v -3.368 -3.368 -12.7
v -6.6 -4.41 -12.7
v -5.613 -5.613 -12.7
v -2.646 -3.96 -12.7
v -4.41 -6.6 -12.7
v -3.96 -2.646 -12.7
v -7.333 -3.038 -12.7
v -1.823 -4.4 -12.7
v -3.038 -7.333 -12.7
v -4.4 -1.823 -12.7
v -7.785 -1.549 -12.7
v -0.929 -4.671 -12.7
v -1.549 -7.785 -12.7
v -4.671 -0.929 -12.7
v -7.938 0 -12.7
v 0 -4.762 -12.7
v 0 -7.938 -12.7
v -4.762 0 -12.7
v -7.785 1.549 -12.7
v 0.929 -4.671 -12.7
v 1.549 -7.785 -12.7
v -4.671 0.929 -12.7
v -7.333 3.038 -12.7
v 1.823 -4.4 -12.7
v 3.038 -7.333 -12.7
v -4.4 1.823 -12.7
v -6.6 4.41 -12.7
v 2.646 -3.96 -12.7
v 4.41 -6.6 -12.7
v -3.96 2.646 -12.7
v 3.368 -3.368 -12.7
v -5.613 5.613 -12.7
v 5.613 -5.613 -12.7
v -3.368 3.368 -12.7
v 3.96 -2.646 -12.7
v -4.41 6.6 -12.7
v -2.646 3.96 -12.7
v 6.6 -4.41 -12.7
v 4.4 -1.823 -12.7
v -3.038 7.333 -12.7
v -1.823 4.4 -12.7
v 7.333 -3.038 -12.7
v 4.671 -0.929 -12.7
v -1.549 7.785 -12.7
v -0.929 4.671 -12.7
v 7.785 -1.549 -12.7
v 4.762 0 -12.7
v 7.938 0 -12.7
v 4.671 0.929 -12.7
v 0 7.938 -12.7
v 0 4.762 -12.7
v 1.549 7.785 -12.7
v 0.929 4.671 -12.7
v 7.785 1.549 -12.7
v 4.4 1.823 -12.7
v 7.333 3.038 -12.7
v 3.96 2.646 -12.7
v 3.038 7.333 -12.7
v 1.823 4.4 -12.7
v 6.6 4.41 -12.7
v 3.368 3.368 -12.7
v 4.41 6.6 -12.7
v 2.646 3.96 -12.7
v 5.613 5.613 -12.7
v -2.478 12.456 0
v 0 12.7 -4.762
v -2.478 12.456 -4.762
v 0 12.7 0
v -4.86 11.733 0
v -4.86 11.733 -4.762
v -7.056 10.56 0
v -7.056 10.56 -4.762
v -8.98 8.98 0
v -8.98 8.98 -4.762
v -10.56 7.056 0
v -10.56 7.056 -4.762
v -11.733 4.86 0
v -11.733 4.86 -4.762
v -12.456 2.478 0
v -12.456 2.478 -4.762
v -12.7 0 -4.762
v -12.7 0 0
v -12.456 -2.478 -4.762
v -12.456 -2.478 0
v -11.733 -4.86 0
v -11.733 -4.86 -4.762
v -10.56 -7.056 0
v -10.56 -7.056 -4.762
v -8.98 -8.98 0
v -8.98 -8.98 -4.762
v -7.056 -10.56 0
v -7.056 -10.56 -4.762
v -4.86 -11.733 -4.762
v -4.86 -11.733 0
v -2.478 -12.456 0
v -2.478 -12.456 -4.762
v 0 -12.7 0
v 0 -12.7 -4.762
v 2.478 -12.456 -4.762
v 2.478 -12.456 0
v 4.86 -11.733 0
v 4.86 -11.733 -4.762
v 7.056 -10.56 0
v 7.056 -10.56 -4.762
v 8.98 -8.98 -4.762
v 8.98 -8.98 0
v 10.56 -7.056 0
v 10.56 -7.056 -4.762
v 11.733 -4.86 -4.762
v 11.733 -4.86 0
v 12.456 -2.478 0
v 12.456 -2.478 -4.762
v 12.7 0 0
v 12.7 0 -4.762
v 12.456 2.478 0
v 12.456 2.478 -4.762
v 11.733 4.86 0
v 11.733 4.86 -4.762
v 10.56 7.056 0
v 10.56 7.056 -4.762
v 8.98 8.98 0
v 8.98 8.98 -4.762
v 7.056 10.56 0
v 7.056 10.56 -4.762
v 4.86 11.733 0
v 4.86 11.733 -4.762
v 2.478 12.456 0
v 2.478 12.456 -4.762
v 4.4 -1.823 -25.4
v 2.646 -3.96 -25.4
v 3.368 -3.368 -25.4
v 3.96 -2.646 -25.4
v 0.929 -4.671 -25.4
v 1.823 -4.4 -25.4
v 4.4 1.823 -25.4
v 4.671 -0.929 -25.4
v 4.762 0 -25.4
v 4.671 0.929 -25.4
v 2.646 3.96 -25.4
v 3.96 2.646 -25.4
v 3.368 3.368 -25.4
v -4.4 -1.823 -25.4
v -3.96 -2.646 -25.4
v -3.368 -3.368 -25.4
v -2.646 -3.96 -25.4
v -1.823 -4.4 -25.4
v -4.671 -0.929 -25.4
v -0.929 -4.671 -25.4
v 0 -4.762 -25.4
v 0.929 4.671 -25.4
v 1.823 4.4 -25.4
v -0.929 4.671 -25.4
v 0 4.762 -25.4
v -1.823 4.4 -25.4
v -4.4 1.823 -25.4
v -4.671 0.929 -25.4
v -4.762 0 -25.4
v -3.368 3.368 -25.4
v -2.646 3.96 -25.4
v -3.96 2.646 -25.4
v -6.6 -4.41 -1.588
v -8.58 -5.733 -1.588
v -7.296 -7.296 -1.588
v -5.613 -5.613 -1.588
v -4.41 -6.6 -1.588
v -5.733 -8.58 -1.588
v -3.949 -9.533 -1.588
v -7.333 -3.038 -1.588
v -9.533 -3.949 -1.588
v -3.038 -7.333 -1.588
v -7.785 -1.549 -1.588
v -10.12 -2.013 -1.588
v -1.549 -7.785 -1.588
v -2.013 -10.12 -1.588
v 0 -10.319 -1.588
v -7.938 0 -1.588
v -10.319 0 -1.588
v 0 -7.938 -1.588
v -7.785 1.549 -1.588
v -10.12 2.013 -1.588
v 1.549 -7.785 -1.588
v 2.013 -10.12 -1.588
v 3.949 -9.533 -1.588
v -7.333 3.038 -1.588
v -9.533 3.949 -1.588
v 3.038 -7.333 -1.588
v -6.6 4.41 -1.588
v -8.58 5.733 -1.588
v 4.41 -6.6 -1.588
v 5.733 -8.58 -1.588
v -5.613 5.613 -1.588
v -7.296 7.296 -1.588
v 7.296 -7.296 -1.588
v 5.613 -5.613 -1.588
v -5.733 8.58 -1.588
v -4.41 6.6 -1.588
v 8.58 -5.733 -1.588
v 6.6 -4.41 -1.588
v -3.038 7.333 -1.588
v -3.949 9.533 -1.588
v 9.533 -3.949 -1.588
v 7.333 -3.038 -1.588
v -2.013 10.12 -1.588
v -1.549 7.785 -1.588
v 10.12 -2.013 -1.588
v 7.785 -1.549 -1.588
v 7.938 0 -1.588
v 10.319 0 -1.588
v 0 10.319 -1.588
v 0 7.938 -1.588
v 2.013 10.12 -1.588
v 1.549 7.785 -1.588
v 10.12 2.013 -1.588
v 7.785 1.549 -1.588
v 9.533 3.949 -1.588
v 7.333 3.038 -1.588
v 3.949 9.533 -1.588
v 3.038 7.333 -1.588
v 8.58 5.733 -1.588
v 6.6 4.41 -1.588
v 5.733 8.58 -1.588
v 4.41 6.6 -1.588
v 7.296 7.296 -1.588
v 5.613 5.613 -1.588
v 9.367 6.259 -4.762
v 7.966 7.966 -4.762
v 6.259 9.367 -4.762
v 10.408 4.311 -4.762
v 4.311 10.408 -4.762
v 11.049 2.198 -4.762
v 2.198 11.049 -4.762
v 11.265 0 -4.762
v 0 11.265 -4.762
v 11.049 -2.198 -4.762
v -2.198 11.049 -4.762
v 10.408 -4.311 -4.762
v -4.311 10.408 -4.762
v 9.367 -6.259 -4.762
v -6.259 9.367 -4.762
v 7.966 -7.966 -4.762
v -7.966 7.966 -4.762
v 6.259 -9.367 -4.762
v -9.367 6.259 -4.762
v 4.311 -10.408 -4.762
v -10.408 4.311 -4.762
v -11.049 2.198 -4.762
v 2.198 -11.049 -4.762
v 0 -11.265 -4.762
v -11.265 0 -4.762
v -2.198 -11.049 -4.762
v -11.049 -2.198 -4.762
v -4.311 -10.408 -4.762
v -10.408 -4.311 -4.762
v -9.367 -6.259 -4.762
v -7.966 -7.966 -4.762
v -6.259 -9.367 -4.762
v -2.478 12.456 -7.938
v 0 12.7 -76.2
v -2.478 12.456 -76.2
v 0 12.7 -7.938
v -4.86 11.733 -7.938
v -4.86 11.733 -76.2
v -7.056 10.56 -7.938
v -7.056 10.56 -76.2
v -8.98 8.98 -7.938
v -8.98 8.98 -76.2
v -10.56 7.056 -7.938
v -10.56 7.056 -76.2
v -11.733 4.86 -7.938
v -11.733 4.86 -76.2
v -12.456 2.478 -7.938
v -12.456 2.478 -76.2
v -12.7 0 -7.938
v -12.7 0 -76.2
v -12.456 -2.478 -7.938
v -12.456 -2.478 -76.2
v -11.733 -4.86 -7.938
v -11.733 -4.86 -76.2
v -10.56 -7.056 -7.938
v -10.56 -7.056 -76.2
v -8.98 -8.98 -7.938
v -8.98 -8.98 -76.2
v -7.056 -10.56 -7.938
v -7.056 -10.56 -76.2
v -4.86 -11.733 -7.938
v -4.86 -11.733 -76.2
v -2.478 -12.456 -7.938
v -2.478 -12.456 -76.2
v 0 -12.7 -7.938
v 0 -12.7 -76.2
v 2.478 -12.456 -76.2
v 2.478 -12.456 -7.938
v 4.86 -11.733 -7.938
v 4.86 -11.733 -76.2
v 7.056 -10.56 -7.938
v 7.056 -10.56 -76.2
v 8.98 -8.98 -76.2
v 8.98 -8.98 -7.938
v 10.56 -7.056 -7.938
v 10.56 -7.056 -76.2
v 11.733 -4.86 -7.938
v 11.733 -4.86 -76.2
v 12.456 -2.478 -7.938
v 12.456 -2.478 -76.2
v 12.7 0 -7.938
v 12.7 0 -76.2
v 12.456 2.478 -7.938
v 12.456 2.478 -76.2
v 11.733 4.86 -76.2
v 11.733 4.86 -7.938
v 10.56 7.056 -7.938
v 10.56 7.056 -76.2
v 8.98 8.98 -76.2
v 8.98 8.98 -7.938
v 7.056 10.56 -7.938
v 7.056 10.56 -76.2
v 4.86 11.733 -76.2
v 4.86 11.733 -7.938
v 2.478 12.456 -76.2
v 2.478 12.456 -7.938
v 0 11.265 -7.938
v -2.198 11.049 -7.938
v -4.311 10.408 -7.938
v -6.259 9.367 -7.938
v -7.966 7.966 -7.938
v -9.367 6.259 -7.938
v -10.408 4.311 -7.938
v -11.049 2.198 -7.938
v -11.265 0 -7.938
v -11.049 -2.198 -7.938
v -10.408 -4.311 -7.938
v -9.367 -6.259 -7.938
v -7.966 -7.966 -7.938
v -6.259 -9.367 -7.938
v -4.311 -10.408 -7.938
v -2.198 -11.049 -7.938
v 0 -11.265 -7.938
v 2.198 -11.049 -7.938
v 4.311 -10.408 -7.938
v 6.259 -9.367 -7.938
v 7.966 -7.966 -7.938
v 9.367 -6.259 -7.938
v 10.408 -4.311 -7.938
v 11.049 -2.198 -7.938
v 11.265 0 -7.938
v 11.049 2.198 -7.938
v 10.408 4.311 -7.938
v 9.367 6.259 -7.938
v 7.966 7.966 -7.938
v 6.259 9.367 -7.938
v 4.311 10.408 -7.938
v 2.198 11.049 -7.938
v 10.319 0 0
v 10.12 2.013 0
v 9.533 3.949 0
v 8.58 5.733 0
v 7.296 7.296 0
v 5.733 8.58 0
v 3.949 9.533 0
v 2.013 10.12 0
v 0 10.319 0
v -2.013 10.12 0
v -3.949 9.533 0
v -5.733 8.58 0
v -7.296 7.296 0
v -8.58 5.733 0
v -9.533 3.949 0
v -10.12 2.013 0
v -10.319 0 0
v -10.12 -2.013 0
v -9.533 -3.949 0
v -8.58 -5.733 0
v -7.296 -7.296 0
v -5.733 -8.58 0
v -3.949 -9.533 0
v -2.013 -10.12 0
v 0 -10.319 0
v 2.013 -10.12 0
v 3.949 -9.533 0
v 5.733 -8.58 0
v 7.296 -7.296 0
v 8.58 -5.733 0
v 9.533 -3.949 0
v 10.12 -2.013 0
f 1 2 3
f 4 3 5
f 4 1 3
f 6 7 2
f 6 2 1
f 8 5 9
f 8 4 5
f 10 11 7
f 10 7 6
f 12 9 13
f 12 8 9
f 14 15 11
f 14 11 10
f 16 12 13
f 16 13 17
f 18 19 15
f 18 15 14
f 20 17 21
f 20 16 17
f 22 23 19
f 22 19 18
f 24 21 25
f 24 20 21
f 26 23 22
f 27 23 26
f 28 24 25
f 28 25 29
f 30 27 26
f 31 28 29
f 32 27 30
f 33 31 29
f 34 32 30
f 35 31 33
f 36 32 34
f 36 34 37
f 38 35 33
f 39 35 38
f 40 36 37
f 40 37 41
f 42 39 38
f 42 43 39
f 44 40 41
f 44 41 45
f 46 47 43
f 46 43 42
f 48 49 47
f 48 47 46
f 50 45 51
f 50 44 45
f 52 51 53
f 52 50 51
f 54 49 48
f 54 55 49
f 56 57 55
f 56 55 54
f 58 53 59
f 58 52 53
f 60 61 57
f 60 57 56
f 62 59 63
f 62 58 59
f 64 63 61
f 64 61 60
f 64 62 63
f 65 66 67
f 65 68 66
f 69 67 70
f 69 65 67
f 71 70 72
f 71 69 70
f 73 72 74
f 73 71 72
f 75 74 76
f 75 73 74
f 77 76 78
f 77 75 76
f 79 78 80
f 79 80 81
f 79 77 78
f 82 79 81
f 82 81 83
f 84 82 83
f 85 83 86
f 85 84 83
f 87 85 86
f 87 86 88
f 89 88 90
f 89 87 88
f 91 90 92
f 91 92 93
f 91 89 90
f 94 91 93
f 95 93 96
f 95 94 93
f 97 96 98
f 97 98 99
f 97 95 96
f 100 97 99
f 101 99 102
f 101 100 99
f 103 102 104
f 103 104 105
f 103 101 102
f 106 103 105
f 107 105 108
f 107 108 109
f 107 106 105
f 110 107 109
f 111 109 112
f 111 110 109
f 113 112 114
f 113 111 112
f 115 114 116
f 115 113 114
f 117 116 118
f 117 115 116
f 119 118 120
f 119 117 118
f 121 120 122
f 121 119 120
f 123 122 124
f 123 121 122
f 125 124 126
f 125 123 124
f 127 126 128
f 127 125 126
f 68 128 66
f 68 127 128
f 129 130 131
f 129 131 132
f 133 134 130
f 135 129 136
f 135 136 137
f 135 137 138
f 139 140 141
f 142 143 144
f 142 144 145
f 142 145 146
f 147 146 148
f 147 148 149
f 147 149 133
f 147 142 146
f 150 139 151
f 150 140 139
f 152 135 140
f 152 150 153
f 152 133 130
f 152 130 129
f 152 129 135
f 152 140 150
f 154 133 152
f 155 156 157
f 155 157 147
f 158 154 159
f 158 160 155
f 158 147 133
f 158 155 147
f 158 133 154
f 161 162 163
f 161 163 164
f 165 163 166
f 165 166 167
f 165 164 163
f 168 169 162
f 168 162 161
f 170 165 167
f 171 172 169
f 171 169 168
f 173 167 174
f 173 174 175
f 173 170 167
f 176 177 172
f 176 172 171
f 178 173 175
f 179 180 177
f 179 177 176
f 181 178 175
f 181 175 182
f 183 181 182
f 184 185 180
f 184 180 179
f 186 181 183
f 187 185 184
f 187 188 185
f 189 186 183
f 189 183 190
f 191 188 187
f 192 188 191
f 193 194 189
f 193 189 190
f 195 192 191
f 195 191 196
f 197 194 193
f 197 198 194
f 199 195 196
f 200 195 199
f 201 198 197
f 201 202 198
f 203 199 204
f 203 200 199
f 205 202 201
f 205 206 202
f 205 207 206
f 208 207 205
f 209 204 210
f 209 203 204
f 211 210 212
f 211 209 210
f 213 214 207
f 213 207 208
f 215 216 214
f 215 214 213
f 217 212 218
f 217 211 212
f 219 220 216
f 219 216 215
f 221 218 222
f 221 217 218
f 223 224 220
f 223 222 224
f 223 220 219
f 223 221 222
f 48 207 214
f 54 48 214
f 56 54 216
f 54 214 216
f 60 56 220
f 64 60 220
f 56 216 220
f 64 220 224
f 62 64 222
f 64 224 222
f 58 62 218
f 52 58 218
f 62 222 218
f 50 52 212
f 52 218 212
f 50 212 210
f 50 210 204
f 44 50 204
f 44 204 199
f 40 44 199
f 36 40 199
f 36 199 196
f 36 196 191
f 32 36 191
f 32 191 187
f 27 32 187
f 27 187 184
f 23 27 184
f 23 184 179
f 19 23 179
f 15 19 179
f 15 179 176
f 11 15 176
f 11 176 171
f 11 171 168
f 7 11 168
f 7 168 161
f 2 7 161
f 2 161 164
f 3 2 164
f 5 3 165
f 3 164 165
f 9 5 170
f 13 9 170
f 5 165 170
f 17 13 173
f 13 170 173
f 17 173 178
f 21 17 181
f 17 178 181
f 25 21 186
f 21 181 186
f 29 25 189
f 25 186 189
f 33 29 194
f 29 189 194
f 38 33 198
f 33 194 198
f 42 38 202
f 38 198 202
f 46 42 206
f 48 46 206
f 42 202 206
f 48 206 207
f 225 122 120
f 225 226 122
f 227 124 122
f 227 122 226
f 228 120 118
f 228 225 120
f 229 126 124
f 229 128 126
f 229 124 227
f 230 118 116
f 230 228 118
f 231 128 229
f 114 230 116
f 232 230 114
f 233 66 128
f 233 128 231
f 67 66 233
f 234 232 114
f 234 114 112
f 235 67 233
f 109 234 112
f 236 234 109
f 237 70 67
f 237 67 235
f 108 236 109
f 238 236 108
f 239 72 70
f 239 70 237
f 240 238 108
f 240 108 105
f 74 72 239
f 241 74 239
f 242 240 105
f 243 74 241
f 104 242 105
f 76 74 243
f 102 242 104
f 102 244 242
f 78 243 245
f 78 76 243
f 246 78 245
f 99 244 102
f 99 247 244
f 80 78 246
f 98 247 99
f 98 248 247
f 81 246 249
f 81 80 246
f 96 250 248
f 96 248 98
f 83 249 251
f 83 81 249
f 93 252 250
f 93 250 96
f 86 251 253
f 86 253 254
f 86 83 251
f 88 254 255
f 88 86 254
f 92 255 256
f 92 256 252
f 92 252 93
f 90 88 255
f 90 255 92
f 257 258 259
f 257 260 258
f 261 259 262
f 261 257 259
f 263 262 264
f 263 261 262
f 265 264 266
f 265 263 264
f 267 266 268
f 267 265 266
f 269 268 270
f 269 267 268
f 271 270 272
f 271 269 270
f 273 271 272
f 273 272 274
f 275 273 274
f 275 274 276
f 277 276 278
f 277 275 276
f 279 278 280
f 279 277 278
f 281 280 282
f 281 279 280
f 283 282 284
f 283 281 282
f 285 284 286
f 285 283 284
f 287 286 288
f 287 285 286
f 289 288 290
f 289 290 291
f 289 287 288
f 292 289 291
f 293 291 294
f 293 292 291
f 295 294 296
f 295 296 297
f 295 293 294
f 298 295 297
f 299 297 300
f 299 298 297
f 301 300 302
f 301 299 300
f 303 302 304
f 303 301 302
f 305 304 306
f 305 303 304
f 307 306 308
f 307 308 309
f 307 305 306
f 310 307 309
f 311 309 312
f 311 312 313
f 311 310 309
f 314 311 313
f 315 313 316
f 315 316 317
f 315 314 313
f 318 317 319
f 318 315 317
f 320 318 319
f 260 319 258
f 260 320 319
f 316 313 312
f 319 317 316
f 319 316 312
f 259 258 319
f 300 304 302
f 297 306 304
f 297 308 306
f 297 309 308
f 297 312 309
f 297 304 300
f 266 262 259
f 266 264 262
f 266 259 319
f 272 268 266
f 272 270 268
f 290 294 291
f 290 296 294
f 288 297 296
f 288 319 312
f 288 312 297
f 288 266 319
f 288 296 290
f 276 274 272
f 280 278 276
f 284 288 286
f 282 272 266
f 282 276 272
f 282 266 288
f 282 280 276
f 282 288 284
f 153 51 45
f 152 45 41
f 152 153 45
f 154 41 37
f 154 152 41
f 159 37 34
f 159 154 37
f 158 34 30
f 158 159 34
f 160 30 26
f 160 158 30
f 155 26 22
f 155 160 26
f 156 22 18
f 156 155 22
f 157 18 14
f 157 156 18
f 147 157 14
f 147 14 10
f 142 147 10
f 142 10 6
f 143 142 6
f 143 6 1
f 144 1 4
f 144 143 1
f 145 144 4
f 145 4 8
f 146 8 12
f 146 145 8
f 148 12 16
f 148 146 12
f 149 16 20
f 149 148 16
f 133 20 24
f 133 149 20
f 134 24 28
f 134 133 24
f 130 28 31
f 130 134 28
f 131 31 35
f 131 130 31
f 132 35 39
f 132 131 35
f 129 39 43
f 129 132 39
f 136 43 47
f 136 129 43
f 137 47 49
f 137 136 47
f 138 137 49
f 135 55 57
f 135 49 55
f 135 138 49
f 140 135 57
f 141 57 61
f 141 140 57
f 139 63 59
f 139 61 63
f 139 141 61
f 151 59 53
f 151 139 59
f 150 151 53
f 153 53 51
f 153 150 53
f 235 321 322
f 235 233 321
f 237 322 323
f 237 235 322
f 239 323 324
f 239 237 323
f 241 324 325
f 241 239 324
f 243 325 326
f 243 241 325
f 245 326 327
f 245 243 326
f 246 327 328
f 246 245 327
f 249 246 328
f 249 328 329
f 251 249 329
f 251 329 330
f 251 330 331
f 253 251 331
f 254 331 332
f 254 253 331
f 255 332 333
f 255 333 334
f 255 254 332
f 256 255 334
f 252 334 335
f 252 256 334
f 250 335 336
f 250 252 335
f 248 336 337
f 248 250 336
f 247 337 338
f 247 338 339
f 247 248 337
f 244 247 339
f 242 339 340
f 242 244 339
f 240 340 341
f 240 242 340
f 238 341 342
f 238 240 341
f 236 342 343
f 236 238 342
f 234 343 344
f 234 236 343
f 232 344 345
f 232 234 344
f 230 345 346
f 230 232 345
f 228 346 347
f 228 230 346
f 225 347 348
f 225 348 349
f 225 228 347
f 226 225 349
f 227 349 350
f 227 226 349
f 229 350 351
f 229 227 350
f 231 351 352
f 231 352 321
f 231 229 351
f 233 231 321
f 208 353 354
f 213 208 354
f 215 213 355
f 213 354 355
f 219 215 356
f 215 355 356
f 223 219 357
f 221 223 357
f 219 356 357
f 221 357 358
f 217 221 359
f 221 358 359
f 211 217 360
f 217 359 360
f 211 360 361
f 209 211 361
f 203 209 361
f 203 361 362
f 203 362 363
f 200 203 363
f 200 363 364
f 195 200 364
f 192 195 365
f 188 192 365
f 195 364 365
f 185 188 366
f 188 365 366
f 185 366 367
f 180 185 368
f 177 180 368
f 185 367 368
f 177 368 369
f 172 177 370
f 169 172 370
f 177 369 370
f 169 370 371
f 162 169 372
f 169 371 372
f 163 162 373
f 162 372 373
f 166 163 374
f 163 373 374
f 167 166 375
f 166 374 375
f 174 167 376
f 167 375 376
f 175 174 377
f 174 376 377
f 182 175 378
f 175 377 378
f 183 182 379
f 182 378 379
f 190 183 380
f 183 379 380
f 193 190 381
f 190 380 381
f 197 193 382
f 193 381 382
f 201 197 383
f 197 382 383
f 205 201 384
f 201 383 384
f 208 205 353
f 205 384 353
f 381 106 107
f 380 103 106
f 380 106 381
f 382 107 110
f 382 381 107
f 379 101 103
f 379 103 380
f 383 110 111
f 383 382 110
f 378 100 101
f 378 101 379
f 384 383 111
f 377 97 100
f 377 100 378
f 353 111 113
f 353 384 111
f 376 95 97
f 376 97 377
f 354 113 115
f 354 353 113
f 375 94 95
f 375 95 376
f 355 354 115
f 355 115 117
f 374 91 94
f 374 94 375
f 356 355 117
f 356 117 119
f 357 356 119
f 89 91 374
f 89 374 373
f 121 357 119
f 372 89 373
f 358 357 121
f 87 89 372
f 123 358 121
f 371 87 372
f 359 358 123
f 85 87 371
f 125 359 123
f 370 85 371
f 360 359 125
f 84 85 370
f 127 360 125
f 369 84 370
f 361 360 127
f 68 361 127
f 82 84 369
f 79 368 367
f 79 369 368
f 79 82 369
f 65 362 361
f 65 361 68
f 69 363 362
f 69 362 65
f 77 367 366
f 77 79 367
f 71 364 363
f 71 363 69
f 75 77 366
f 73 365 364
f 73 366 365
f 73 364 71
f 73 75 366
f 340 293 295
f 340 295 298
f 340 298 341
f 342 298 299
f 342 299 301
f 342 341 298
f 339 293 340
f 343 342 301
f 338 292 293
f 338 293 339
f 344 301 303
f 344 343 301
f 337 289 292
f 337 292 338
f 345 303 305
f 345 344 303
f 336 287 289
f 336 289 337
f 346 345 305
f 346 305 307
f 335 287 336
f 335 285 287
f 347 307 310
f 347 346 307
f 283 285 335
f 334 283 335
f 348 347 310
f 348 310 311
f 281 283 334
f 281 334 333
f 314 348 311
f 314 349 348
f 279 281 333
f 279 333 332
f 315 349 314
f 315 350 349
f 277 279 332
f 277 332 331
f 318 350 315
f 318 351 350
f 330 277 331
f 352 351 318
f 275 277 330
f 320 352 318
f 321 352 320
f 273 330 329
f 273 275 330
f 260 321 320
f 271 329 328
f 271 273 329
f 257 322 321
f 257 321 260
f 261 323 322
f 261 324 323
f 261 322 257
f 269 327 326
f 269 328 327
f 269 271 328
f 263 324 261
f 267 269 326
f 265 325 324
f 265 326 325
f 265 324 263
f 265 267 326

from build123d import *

# Parameters (mm, degrees)
F2_R     = 7.9375
F2_R_2   = 4.7625
F3_DEPTH = 12.7
F4_R     = 10.31875
F4_R_2   = 7.9375
F5_DEPTH = 1.5875


with BuildPart() as f1:
    # F0 (on Right) → F1 (revolve)
    with BuildSketch(Plane.YZ):
        Polygon((12.7, -4.7625), (12.7, 0), (4.7625, 0), (4.7625, -25.4), (0, -25.4), (0, -76.2), (12.7, -76.2), (12.7, -7.9375), (11.265334, -7.9375), (11.265334, -4.7625), align=None)
    revolve(axis=Axis((0, 0, -33.687185), (0, 0, 1)))

    # F2 (on face) → F3 (cut)
    with BuildSketch(Plane.XY):
        Circle(F2_R)
        Circle(F2_R_2, mode=Mode.SUBTRACT)
    extrude(amount=-F3_DEPTH, mode=Mode.SUBTRACT)

    # F4 (on face) → F5 (cut)
    with BuildSketch(Plane.XY):
        Circle(F4_R)
        Circle(F4_R_2, mode=Mode.SUBTRACT)
    extrude(amount=-F5_DEPTH, mode=Mode.SUBTRACT)


solid = f1.part
